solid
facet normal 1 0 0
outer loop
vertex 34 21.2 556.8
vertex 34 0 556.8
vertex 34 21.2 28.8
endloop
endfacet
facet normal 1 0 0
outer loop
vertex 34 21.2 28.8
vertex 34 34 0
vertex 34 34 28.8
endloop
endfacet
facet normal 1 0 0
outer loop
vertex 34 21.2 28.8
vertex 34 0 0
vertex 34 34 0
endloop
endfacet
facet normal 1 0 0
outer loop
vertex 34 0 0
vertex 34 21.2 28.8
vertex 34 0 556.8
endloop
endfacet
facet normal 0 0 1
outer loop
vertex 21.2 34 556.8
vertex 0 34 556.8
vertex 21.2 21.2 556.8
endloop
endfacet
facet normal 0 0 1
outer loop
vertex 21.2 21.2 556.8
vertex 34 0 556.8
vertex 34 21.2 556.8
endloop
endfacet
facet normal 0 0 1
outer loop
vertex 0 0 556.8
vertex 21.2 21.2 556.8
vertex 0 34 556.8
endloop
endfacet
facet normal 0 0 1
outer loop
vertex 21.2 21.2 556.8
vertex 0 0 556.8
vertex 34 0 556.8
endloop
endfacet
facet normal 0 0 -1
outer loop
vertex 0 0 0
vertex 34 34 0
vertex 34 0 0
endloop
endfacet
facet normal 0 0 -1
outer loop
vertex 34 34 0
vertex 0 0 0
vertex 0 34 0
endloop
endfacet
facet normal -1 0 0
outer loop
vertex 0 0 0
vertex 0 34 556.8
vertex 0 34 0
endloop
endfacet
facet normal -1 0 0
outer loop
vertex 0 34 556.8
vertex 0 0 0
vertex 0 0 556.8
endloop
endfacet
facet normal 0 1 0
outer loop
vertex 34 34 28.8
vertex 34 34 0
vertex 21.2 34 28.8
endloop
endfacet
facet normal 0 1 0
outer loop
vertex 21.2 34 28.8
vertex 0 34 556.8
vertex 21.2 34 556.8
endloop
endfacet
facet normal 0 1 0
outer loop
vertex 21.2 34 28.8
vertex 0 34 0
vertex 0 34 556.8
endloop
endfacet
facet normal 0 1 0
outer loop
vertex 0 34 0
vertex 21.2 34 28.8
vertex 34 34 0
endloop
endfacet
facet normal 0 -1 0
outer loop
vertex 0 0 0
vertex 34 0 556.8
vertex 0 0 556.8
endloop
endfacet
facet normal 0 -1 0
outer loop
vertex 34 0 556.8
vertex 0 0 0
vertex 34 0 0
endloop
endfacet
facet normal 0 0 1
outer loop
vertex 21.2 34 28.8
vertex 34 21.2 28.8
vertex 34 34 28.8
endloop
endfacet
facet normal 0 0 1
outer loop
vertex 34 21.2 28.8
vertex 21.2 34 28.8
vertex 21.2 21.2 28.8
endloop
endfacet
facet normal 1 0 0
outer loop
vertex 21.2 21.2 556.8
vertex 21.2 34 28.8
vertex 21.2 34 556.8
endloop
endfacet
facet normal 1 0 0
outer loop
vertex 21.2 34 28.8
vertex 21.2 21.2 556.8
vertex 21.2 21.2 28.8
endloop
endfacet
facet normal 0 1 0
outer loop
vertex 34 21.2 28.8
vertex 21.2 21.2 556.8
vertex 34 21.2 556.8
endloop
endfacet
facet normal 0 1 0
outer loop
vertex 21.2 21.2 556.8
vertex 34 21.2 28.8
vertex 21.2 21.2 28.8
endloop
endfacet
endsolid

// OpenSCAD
/*
Corner post.
Print orientation: print upright, with the post height along Z.
Quantity: four.
*/

use <../planter_support_free.scad>

export_corner_post();
